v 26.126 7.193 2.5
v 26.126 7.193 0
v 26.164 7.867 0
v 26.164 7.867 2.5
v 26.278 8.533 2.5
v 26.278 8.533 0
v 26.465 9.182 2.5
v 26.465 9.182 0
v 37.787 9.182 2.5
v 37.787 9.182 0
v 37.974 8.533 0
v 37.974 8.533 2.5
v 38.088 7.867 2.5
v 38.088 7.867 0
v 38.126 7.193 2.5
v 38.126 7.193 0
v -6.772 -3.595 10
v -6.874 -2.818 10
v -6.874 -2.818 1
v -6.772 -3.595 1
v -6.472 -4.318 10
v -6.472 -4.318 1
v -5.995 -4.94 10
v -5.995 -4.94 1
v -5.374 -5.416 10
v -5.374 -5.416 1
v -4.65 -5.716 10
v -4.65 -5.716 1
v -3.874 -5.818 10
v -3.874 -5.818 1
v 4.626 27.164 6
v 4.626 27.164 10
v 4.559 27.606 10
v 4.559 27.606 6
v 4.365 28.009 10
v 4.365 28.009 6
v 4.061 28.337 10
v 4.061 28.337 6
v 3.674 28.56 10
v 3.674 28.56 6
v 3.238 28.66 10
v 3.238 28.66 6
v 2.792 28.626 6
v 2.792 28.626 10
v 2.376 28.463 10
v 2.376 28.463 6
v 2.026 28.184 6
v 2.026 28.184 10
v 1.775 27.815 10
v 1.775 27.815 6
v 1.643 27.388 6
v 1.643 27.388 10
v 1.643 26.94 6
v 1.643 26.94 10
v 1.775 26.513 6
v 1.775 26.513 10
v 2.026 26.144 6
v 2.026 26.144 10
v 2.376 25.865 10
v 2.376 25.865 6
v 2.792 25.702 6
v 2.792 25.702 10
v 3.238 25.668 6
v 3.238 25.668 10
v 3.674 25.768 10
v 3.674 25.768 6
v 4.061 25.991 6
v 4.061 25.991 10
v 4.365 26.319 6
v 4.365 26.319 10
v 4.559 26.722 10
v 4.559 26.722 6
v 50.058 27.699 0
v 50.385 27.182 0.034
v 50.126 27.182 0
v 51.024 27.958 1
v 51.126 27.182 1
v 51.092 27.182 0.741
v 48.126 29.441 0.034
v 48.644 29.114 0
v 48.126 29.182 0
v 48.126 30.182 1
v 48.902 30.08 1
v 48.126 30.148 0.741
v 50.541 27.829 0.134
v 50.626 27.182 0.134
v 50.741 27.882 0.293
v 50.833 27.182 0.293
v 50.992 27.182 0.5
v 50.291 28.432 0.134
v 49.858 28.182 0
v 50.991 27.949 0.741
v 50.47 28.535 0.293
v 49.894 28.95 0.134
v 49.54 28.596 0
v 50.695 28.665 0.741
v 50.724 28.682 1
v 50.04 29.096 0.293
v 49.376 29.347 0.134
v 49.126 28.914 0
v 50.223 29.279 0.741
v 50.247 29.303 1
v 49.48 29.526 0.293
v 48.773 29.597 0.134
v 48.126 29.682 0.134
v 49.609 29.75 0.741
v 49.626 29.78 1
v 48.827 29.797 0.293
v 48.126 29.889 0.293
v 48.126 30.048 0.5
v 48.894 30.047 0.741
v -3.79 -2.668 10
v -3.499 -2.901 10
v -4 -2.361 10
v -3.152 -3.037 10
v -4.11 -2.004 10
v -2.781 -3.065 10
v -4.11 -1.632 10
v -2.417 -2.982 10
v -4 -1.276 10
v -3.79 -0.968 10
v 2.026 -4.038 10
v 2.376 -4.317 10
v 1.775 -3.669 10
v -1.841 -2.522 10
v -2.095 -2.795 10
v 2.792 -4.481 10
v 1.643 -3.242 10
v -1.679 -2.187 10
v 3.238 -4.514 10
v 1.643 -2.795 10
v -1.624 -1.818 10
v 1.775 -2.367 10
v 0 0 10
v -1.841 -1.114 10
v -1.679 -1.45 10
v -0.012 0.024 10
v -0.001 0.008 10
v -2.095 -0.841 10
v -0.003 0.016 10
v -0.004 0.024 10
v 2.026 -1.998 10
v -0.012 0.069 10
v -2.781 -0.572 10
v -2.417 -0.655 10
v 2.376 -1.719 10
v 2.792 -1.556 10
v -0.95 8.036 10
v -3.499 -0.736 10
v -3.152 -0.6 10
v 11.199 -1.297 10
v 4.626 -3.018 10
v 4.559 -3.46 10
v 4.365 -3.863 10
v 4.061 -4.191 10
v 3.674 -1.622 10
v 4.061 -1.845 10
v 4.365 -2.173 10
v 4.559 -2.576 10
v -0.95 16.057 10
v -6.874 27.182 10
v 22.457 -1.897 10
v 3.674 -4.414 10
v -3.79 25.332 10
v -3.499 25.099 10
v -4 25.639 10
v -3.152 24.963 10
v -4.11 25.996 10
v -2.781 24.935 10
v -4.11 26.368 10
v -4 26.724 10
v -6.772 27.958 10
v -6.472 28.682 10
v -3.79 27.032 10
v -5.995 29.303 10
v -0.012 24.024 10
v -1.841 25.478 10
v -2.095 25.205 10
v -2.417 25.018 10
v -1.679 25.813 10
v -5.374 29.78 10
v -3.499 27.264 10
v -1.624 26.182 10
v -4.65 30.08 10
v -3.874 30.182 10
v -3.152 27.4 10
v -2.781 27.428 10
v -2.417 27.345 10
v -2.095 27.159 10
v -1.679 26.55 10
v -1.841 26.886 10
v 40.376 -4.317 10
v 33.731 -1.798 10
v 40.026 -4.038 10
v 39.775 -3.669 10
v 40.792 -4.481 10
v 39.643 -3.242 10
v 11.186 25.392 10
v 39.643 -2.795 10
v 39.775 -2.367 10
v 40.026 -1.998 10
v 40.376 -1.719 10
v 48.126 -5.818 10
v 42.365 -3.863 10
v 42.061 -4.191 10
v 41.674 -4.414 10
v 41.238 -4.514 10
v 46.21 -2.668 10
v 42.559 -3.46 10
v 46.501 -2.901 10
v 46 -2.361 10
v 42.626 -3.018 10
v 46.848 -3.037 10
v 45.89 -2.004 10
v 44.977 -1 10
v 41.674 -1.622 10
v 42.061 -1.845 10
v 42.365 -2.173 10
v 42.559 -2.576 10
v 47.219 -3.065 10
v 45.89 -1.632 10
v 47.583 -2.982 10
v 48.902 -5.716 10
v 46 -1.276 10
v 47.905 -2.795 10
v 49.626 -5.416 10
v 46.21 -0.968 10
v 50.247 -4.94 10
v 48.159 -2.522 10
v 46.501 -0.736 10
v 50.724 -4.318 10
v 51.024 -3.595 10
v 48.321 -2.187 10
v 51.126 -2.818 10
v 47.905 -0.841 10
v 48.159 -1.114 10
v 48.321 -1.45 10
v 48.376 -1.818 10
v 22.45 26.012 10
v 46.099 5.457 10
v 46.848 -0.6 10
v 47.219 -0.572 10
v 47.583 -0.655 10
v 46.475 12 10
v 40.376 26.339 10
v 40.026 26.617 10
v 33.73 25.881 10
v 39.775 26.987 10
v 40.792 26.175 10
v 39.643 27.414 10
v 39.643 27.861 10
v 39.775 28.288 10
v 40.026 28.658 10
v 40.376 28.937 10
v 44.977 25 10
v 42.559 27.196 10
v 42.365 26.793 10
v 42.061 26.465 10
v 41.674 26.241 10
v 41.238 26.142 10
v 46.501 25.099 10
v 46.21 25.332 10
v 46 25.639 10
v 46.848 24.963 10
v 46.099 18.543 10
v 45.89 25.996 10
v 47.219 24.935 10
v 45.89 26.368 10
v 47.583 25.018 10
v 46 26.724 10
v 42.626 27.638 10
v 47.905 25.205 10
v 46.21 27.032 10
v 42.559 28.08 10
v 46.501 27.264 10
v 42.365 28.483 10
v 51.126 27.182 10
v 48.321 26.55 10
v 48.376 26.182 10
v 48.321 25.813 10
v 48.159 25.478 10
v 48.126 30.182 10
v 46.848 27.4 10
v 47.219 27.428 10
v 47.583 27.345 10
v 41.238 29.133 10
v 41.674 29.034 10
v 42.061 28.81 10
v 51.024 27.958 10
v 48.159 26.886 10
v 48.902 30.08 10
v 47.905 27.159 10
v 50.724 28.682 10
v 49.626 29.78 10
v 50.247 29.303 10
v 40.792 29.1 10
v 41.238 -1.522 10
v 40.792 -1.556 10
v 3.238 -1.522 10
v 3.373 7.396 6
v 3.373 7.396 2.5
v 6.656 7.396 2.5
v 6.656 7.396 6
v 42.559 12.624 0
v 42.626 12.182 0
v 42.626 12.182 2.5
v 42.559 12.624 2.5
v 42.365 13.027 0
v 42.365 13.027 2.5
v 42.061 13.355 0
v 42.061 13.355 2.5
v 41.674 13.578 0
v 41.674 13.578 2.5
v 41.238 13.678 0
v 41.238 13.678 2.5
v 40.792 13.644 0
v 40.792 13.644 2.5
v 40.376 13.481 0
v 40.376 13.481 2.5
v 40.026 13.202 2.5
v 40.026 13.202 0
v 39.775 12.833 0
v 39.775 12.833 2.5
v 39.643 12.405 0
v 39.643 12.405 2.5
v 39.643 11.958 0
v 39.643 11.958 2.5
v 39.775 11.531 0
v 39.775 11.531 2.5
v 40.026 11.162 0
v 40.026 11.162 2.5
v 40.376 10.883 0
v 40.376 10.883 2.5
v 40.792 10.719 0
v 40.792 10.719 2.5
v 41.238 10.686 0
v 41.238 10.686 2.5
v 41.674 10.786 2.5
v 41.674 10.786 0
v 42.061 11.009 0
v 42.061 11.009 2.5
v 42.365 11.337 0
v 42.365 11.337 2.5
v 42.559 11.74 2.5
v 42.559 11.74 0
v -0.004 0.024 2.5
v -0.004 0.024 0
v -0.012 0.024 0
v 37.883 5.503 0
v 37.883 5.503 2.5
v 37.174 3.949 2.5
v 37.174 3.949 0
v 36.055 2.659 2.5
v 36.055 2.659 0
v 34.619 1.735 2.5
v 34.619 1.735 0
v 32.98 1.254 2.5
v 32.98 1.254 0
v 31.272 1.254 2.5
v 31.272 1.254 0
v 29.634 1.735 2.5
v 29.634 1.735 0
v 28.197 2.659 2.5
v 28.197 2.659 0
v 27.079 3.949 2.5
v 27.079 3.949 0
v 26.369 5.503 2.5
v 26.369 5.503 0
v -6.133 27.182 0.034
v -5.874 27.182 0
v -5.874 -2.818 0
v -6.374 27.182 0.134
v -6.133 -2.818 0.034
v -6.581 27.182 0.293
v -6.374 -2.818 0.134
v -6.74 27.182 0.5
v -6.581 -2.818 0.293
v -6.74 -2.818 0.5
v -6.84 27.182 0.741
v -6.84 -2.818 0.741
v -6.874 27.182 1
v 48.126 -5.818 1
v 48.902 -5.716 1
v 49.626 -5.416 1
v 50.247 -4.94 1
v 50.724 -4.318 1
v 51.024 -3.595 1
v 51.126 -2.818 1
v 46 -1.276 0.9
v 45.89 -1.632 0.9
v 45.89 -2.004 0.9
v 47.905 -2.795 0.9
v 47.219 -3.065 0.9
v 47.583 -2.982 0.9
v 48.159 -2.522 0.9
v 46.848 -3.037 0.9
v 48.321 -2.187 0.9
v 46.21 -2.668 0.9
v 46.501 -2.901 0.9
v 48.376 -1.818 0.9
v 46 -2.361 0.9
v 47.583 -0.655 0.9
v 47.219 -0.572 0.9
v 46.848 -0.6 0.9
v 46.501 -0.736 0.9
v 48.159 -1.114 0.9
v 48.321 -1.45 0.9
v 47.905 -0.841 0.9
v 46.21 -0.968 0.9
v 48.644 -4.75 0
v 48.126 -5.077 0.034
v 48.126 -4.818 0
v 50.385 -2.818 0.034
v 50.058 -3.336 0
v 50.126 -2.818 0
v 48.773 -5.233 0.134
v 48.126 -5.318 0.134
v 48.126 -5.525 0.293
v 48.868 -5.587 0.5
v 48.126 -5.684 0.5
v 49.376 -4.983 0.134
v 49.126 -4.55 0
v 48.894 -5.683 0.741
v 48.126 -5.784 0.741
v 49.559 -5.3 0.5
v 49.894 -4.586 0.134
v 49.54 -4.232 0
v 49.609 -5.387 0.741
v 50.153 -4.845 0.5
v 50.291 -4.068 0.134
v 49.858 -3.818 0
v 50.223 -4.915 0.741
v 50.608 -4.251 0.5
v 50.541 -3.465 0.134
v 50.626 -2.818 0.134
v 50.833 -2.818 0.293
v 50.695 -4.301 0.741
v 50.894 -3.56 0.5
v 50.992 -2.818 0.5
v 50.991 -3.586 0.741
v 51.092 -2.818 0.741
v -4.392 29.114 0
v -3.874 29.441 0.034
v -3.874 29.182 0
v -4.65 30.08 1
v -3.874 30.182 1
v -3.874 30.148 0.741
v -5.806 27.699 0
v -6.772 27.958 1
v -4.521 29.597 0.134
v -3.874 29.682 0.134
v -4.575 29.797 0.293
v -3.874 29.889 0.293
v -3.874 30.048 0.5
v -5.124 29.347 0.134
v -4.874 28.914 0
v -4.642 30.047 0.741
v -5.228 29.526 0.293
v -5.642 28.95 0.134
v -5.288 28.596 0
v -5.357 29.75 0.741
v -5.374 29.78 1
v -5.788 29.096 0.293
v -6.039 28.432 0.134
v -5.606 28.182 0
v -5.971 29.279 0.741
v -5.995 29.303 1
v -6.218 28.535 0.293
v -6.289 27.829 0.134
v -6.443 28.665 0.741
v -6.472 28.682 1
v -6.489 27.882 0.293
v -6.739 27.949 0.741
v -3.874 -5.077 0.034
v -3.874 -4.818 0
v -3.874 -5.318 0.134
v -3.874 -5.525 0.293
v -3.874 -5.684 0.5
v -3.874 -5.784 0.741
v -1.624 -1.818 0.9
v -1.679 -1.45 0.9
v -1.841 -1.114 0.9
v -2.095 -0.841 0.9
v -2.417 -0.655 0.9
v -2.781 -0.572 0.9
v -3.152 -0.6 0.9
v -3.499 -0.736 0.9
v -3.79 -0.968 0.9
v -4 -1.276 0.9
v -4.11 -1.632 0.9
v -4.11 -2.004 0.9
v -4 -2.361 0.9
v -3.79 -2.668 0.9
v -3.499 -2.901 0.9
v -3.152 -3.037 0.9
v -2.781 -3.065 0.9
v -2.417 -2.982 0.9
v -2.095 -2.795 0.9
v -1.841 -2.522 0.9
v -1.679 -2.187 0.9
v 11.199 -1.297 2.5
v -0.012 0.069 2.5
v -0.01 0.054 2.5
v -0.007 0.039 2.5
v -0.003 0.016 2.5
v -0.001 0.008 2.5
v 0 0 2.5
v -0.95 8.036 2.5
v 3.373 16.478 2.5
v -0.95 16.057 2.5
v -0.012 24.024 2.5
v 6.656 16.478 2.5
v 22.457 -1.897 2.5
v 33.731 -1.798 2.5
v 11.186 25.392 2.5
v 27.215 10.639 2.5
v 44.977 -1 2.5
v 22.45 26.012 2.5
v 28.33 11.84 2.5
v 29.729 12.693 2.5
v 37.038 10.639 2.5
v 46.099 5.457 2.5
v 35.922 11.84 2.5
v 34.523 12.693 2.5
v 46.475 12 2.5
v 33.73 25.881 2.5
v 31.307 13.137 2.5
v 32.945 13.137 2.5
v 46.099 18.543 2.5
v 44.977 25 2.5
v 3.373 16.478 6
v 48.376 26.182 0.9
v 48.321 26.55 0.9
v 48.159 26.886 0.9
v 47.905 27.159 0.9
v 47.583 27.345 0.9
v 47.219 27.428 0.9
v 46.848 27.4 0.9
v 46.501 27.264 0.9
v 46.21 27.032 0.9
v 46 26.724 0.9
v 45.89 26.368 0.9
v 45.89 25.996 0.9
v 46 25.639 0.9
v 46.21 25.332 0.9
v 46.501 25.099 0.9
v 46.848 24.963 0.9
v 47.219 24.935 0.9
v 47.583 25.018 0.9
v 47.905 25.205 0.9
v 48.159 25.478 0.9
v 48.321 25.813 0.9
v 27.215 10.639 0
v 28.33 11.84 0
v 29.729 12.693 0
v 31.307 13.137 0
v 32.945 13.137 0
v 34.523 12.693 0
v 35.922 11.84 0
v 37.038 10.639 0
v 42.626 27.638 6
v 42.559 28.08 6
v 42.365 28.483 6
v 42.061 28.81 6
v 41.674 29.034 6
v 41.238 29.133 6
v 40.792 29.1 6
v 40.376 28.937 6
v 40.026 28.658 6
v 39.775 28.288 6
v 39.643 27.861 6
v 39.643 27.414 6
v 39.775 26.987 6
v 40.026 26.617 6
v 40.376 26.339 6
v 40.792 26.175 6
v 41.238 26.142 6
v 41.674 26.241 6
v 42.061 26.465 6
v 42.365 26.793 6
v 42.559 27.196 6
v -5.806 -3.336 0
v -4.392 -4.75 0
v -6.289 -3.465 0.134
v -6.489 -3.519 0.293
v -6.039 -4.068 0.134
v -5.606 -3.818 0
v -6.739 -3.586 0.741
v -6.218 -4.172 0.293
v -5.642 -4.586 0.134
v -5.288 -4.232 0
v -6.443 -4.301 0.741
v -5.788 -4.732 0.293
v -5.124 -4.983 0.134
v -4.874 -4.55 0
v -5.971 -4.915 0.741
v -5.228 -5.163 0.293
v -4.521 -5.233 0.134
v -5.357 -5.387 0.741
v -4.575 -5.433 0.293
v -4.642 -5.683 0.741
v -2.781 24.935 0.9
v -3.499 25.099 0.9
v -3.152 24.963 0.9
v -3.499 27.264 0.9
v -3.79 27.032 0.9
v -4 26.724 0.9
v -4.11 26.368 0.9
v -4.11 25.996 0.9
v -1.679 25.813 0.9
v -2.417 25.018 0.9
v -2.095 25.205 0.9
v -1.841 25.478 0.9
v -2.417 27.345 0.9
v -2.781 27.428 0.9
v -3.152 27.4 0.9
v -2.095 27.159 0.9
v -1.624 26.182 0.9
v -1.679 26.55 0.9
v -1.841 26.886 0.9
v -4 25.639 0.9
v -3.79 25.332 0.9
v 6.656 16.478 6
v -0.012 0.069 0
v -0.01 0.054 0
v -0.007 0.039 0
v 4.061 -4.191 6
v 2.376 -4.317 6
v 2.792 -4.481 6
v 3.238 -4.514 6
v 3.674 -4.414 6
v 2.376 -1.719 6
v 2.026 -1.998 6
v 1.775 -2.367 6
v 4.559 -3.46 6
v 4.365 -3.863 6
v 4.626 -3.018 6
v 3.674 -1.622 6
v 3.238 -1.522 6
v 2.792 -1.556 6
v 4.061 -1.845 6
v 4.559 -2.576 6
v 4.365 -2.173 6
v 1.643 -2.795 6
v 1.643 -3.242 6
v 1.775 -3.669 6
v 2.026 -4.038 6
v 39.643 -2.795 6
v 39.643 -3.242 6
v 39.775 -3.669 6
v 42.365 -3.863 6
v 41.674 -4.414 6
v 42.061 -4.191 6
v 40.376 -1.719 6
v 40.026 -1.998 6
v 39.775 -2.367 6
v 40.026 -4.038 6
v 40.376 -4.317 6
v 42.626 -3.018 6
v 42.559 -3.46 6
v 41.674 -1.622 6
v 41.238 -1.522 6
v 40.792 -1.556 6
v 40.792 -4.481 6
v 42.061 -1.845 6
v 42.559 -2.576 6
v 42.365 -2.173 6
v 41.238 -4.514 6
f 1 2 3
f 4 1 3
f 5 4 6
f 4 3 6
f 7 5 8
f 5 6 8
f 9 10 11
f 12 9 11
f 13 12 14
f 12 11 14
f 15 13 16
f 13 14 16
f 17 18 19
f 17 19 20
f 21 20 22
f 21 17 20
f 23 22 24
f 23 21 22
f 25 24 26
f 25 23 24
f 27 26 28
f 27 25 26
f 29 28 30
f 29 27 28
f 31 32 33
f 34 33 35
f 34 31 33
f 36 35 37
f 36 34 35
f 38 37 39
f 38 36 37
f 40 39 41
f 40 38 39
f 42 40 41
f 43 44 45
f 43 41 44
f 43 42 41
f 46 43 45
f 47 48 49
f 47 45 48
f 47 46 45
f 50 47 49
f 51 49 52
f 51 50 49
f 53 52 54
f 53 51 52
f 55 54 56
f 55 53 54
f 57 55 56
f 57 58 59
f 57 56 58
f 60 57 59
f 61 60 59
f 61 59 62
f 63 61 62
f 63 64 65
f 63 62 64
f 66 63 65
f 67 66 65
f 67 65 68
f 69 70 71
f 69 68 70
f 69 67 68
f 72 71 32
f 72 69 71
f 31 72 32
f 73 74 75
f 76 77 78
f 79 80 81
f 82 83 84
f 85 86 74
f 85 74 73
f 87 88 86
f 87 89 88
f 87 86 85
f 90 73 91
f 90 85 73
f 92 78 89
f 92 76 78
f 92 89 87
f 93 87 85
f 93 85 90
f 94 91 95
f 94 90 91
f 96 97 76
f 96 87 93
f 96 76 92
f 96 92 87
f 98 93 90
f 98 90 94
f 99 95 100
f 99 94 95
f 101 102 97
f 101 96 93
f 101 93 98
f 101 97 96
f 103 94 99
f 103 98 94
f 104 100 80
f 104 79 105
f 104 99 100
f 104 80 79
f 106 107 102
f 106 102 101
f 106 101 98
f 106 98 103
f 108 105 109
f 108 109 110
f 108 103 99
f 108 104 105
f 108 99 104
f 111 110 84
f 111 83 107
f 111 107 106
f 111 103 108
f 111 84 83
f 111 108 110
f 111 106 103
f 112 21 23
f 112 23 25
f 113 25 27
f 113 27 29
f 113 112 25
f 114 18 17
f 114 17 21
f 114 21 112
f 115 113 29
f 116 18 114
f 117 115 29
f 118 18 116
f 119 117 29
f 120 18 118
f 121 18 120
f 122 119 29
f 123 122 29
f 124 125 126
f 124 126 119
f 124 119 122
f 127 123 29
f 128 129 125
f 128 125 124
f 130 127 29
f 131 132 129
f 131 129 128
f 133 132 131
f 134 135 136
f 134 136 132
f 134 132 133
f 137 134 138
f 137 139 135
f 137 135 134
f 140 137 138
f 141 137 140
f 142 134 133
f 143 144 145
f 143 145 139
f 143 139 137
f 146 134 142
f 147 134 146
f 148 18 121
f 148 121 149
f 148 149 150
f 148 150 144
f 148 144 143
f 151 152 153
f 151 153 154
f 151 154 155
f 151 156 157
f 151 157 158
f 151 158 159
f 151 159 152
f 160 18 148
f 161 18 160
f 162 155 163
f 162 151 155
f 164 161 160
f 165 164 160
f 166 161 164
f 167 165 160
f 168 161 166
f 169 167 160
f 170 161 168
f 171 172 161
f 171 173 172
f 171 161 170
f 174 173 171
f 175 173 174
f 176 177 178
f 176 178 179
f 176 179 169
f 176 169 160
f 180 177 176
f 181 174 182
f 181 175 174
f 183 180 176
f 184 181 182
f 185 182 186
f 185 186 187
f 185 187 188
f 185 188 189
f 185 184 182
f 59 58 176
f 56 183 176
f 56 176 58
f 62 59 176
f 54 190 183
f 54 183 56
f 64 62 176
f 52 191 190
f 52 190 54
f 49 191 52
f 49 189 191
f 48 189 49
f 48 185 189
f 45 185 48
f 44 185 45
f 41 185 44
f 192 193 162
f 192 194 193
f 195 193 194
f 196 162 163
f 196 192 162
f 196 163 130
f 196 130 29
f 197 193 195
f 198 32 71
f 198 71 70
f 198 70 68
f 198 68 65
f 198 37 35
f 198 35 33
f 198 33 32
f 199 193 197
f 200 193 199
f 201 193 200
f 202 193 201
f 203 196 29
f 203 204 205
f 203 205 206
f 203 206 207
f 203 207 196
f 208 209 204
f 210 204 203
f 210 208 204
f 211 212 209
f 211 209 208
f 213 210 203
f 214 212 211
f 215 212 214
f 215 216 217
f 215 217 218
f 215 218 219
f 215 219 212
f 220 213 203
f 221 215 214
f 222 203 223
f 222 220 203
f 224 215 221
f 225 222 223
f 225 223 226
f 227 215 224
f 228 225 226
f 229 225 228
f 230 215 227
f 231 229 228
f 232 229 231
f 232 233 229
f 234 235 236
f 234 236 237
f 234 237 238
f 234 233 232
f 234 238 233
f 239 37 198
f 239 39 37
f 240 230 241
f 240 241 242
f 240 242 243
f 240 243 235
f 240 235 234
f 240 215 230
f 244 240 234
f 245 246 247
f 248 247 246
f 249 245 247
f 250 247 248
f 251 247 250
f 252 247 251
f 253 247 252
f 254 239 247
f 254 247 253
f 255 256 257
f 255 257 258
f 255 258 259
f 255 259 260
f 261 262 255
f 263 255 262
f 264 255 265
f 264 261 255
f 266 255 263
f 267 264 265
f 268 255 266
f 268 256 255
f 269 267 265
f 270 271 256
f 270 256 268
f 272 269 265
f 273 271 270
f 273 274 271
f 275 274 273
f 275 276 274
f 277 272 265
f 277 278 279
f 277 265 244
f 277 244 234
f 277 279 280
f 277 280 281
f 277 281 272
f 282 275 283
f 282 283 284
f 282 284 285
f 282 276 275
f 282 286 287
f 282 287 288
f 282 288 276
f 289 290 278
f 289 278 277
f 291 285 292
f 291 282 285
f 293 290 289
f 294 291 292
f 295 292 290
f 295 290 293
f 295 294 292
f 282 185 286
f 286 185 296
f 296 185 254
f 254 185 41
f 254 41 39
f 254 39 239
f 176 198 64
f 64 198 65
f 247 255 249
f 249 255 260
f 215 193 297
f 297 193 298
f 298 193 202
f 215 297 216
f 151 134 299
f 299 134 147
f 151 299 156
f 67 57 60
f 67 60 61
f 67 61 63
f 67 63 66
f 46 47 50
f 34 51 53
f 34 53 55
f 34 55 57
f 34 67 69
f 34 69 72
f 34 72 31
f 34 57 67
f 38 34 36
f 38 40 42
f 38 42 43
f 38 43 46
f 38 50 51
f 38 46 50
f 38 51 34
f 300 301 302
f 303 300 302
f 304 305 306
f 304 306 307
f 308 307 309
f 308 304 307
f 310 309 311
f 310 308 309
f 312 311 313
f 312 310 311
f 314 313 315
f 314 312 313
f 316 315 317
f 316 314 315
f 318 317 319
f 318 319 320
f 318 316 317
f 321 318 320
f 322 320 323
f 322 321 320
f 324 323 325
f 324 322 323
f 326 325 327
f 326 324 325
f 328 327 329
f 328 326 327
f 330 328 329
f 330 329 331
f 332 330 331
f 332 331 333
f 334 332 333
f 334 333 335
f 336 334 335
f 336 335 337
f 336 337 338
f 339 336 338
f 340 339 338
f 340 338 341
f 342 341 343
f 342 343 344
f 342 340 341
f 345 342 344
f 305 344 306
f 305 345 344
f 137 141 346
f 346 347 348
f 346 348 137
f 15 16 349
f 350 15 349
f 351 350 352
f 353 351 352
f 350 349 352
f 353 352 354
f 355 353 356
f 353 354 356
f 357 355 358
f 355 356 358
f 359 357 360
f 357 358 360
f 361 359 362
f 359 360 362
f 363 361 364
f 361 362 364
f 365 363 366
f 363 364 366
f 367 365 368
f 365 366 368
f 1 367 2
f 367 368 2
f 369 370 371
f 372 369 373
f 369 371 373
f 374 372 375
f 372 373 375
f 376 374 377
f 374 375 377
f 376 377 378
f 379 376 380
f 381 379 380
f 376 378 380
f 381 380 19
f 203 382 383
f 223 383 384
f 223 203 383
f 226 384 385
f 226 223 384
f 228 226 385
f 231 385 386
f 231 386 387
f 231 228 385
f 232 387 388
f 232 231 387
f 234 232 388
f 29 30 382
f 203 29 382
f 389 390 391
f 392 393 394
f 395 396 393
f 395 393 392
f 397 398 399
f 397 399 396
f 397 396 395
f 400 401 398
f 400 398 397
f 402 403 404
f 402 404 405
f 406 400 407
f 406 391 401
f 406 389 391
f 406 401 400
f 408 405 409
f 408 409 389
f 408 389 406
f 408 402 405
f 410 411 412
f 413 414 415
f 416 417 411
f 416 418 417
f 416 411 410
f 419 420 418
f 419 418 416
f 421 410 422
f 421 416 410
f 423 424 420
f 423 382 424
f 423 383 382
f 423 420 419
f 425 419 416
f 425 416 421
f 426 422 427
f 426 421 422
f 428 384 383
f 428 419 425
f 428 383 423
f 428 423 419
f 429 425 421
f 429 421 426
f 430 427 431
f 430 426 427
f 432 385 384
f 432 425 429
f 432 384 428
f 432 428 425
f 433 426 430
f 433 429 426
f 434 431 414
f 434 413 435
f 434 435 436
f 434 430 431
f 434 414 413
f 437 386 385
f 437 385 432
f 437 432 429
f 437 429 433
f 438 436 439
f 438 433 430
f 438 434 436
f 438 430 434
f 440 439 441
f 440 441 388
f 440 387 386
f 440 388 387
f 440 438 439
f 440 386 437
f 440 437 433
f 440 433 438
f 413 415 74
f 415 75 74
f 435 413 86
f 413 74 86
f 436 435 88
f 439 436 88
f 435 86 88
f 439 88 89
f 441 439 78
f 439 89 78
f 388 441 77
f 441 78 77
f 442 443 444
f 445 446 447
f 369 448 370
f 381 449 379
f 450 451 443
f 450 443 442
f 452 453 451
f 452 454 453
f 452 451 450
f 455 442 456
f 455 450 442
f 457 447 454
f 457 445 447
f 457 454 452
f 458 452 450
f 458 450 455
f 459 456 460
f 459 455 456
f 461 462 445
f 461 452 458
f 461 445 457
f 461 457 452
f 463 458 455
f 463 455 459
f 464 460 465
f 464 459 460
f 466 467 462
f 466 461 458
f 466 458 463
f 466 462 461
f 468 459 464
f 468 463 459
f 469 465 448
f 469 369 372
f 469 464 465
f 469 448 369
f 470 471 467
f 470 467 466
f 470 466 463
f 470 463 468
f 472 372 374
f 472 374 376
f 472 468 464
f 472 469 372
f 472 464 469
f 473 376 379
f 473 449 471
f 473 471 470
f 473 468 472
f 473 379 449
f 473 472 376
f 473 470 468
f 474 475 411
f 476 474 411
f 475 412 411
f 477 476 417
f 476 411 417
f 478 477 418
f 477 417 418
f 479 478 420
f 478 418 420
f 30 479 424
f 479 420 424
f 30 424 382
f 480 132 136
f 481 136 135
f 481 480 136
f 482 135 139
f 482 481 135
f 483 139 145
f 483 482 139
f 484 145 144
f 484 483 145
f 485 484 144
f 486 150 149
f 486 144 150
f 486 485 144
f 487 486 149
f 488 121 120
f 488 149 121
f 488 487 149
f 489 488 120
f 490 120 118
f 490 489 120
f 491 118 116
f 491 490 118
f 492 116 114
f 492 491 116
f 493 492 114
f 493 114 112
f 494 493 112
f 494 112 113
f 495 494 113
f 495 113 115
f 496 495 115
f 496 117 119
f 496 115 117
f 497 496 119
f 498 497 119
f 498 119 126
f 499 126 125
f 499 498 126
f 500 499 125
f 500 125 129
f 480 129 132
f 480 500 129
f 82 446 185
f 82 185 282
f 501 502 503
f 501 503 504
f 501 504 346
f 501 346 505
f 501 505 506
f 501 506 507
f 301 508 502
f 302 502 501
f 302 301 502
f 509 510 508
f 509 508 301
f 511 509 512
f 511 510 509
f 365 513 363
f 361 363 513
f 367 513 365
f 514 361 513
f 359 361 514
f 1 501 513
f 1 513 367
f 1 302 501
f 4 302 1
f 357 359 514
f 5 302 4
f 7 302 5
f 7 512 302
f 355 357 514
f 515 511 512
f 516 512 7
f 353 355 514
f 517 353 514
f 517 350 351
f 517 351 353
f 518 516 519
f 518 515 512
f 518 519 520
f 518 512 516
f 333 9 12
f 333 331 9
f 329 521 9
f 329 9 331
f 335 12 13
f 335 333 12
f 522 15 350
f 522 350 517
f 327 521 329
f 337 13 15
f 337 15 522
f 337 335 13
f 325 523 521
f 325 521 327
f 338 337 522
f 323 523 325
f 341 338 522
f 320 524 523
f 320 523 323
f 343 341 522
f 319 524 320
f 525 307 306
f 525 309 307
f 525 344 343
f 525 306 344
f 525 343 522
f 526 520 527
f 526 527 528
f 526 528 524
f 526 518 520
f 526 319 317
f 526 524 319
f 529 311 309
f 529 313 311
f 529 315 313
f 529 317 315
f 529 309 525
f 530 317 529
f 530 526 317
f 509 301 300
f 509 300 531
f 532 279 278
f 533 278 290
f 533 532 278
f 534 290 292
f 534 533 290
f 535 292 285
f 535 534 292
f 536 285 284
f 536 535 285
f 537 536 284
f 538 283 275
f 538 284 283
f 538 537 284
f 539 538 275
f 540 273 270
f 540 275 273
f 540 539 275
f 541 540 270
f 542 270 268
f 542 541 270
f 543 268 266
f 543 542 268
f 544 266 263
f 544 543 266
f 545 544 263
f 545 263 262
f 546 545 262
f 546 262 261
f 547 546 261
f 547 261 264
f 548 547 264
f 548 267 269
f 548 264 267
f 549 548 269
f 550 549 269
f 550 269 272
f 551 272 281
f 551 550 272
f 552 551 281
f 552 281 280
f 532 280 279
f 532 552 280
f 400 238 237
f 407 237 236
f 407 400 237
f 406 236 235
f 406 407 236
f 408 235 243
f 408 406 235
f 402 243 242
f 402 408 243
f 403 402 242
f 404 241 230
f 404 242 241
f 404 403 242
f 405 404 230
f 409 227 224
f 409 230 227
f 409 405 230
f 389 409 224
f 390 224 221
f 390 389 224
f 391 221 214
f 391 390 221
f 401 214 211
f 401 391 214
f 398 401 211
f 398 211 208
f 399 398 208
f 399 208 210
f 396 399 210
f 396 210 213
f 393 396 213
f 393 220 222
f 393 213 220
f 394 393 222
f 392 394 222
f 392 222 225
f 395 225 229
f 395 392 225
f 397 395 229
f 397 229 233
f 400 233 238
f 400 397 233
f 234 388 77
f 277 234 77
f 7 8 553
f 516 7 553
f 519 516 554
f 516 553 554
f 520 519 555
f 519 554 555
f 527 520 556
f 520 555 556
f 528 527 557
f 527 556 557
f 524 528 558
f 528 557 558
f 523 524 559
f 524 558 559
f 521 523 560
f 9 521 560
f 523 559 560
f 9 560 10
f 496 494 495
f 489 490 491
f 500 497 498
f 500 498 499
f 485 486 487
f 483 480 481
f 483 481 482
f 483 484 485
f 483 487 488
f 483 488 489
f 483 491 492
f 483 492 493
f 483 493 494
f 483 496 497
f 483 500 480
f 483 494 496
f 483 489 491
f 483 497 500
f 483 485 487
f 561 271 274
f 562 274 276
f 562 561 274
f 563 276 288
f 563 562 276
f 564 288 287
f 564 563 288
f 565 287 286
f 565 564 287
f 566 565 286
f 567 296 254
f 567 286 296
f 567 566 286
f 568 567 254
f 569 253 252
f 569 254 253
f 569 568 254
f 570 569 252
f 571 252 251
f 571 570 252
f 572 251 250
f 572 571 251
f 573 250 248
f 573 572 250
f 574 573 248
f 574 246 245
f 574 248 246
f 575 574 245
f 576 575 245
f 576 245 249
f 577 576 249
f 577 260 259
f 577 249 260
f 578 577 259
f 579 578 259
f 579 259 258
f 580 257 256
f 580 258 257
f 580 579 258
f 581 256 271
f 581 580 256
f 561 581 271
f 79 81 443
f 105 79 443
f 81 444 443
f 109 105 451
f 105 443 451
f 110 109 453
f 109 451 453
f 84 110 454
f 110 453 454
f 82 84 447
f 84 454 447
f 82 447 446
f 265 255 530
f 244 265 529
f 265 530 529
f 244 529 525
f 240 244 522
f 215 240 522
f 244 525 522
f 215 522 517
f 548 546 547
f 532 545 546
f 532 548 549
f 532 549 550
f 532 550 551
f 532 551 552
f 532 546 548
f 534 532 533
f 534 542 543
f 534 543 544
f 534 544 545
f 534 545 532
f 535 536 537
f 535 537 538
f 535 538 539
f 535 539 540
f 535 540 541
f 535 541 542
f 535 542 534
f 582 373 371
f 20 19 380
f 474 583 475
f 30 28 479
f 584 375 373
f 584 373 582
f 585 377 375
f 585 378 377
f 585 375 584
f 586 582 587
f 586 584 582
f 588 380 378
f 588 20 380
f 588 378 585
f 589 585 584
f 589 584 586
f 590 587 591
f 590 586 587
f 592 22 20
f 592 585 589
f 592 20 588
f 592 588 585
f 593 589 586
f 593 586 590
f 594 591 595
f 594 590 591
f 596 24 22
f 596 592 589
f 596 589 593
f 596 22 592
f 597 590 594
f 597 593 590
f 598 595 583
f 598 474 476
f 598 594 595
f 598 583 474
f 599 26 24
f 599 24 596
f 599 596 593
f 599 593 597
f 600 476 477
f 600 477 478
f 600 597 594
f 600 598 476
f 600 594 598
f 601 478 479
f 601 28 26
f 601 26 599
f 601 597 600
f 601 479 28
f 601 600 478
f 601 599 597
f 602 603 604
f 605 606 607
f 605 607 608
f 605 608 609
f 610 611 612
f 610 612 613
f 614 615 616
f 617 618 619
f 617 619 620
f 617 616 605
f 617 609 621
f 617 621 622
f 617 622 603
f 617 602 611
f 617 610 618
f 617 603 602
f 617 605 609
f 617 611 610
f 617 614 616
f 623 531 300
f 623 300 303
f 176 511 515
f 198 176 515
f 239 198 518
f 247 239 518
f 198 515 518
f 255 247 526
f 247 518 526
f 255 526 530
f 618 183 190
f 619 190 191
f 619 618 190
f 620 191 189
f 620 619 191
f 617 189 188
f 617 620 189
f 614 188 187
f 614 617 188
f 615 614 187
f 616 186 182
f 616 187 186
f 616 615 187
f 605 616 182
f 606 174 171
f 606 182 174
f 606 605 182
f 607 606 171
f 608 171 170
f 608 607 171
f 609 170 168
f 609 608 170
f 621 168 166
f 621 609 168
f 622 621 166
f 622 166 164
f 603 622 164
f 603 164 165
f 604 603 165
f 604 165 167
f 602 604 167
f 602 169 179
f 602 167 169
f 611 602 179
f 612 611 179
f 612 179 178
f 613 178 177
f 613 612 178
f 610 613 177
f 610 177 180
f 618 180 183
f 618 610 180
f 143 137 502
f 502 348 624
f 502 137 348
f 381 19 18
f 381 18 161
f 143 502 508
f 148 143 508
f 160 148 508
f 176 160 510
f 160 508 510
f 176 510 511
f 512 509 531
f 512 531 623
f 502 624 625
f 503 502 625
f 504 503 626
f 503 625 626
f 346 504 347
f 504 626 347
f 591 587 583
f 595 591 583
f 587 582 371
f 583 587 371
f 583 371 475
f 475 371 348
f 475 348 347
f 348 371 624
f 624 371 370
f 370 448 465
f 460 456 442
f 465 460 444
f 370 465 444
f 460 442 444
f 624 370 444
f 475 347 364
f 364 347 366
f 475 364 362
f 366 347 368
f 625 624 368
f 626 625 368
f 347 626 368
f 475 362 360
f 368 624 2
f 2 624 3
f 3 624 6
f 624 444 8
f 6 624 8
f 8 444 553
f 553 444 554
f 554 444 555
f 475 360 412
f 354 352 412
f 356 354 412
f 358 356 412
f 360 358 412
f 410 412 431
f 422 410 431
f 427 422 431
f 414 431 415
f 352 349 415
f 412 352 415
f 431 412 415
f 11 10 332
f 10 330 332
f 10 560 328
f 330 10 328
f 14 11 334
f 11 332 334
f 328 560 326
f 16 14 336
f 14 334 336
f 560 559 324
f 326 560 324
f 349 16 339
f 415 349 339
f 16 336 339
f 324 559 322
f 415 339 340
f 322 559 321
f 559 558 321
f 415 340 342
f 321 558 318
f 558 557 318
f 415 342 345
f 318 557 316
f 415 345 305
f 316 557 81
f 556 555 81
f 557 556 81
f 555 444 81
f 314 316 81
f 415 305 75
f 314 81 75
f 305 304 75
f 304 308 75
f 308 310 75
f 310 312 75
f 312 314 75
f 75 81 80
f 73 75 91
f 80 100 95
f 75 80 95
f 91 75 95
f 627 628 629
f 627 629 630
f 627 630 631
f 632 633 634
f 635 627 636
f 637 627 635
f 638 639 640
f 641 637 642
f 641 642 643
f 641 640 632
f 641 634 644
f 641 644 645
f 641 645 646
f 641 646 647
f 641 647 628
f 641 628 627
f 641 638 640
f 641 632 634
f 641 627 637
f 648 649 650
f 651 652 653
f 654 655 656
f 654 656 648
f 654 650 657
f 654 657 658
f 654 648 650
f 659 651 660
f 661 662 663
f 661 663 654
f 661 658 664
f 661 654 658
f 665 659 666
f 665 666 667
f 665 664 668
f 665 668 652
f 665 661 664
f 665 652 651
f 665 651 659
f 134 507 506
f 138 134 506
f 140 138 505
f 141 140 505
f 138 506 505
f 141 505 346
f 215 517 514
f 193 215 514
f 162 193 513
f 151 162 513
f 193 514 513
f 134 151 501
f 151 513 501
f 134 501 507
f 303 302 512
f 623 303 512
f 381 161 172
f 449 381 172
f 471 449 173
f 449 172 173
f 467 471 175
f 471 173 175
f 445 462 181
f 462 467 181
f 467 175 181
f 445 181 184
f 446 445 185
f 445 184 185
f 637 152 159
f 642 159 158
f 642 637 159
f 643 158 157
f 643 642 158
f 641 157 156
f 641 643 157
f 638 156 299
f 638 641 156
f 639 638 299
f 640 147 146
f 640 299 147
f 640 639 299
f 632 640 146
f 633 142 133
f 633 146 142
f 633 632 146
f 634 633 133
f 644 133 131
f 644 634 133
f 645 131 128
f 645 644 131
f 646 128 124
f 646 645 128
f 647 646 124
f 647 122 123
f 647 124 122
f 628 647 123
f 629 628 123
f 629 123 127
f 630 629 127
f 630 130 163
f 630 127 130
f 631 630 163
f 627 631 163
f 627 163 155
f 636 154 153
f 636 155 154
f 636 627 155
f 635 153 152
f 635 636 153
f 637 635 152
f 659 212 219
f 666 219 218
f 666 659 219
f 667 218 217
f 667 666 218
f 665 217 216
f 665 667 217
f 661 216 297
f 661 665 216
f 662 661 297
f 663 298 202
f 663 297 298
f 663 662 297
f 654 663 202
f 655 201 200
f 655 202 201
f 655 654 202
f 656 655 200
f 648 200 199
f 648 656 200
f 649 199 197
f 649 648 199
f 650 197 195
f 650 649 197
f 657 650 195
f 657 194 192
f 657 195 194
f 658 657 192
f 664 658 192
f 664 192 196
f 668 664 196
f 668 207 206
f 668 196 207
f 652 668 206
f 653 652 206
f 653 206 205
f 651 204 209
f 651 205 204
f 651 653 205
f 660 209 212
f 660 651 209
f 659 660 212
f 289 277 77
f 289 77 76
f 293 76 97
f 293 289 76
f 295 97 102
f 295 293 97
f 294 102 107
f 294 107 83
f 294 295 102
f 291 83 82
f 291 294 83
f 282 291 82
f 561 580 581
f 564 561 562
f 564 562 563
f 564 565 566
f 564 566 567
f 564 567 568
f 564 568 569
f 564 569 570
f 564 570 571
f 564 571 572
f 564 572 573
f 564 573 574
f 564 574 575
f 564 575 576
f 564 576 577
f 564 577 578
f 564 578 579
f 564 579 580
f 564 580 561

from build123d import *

# Parameters (mm, degrees)
F0_W     = 58
F0_H     = 36
F0_R     = 1.25
F0_R_2   = 1.5
F1_DEPTH = 10
F0_R_3   = 1
F0_W_2   = 3.2825097442
F0_H_2   = 9.0816104785
F2_DEPTH = 2.5
F3_R     = 3
F4_DEPTH = 6
F5_START = 0.9
F5_DEPTH = 16.2
F6_START = 6
F6_DEPTH = 10.7
F7_R     = 1


with BuildPart() as f1:
    # F0 (on Top) → F1 (new body)
    with BuildSketch(Plane.XY):
        with Locations((22.1260370687, 12.181818096)):
            Rectangle(F0_W, F0_H)
        with Locations((-2.8739629313, -1.818181904)):
            Circle(F0_R, mode=Mode.SUBTRACT)
        with Locations((3.1260370687, -3.018181904)):
            Circle(F0_R_2, mode=Mode.SUBTRACT)
        with Locations((41.1260370687, -3.018181904)):
            Circle(F0_R_2, mode=Mode.SUBTRACT)
        with Locations((47.1260370687, -1.818181904)):
            Circle(F0_R, mode=Mode.SUBTRACT)
        with BuildLine():
            Line((-0.0042433119, 0.0237876128), (-0.0123524841, 0.02397218))
            Line((-0.0123524841, 0.02397218), (-0.0123524841, 0.0693824727))
            ThreePointArc((-0.0123524841, 0.0693824727), (-1.0671188126, 12.0466773263), (-0.0123524841, 24.02397218))
            ThreePointArc((-0.0123524841, 24.02397218), (22.4498159336, 26.0118318189), (44.9770614896, 25))
            ThreePointArc((44.9770614896, 25), (46.474513746, 12), (44.9770614896, -1))
            ThreePointArc((44.9770614896, -1), (22.4574664967, -1.8971785964), (0, 0))
            ThreePointArc((0, 0), (-0.0021227043, 0.0118936194), (-0.0042433119, 0.0237876128))
        make_face(mode=Mode.SUBTRACT)
        with Locations((-2.8739629313, 26.181818096)):
            Circle(F0_R, mode=Mode.SUBTRACT)
        with Locations((3.1260370687, 27.16396598)):
            Circle(F0_R_2, mode=Mode.SUBTRACT)
        with Locations((41.1260370687, 27.6376707083)):
            Circle(F0_R_2, mode=Mode.SUBTRACT)
        with Locations((47.1260370687, 26.181818096)):
            Circle(F0_R, mode=Mode.SUBTRACT)
        with Locations((-2.8739629313, 26.181818096)):
            Circle(F0_R)
        with Locations((47.1260370687, 26.181818096)):
            Circle(F0_R)
        with Locations((47.1260370687, -1.818181904)):
            Circle(F0_R)
        with Locations((-2.8739629313, -1.818181904)):
            Circle(F0_R)
        with Locations((3.1260370687, -3.018181904)):
            Circle(F0_R_2)
        with Locations((3.1260370687, 27.16396598)):
            Circle(F0_R_2)
        with Locations((41.1260370687, 27.6376707083)):
            Circle(F0_R_2)
        with Locations((41.1260370687, -3.018181904)):
            Circle(F0_R_2)
    extrude(amount=F1_DEPTH)

    # F0 (on Top) → F2 (join)
    with BuildSketch(Plane.XY):
        with BuildLine():
            ThreePointArc((-0.0123524841, 24.02397218), (-1.0671188126, 12.0466773263), (-0.0123524841, 0.0693824727))
            Line((-0.0123524841, 0.0693824727), (-0.0123524841, 24.02397218))
        make_face()
        with BuildLine():
            Line((-0.0123524841, 24.02397218), (-0.0123524841, 0.0693824727))
            ThreePointArc((-0.0123524841, 0.0693824727), (-0.0083017494, 0.0465843578), (-0.0042433119, 0.0237876128))
            Line((-0.0042433119, 0.0237876128), (44.9770614896, -1))
            Line((44.9770614896, -1), (44.9770614896, 25))
            Line((44.9770614896, 25), (-0.0123524841, 24.02397218))
        make_face()
        with Locations((2.9621722015, 2.0848012064)):
            Circle(F0_R_3, mode=Mode.SUBTRACT)
        with Locations((5.0146379508, 11.9371688925)):
            Rectangle(F0_W_2, F0_H_2, mode=Mode.SUBTRACT)
        with Locations((41.7125664489, 2.0848012064)):
            Circle(F0_R_3, mode=Mode.SUBTRACT)
        with BuildLine():
            Line((26.1260370687, 7.1930042468), (26.1260370687, 9.181818096))
            Line((26.1260370687, 9.181818096), (26.4652403515, 9.181818096))
            ThreePointArc((26.4652403515, 9.181818096), (32.1260370687, 13.1930042468), (37.7868337859, 9.181818096))
            Line((37.7868337859, 9.181818096), (38.1260370687, 9.181818096))
            Line((38.1260370687, 9.181818096), (38.1260370687, 7.1930042468))
            Line((38.1260370687, 7.1930042468), (38.1260370687, 1.181818096))
            Line((38.1260370687, 1.181818096), (26.1260370687, 1.181818096))
            Line((26.1260370687, 1.181818096), (26.1260370687, 7.1930042468))
        make_face(mode=Mode.SUBTRACT)
        with Locations((41.1260370687, 12.181818096)):
            Circle(F0_R_2, mode=Mode.SUBTRACT)
        with Locations((18.8074270263, 12.2937392443)):
            Circle(F0_R_3, mode=Mode.SUBTRACT)
        with Locations((2.9621722015, 21.6664075851)):
            Circle(F0_R_3, mode=Mode.SUBTRACT)
        with Locations((26.8074270263, 12.2937392443)):
            Circle(F0_R_3, mode=Mode.SUBTRACT)
        with Locations((41.7125664489, 21.6664075851)):
            Circle(F0_R_3, mode=Mode.SUBTRACT)
        with BuildLine():
            Line((44.9770614896, -1), (-0.0042433119, 0.0237876128))
            ThreePointArc((-0.0042433119, 0.0237876128), (-0.0021227043, 0.0118936194), (0, 0))
            ThreePointArc((0, 0), (22.4574664967, -1.8971785964), (44.9770614896, -1))
        make_face()
        with BuildLine():
            ThreePointArc((44.9770614896, 25), (22.4498159336, 26.0118318189), (-0.0123524841, 24.02397218))
            Line((-0.0123524841, 24.02397218), (44.9770614896, 25))
        make_face()
        with BuildLine():
            Line((44.9770614896, 25), (44.9770614896, -1))
            ThreePointArc((44.9770614896, -1), (46.474513746, 12), (44.9770614896, 25))
        make_face()
        with Locations((2.9621722015, 21.6664075851)):
            Circle(F0_R_3)
        with Locations((2.9621722015, 2.0848012064)):
            Circle(F0_R_3)
        with Locations((41.7125664489, 2.0848012064)):
            Circle(F0_R_3)
        with Locations((41.7125664489, 21.6664075851)):
            Circle(F0_R_3)
        with Locations((18.8074270263, 12.2937392443)):
            Circle(F0_R_3)
        with Locations((26.8074270263, 12.2937392443)):
            Circle(F0_R_3)
        with Locations((5.0146379508, 11.9371688925)):
            Rectangle(F0_W_2, F0_H_2)
        with BuildLine():
            Line((26.4652403515, 9.181818096), (26.1260370687, 9.181818096))
            Line((26.1260370687, 9.181818096), (26.1260370687, 7.1930042468))
            ThreePointArc((26.1260370687, 7.1930042468), (26.2114457767, 8.2017707453), (26.4652403515, 9.181818096))
        make_face()
        with BuildLine():
            ThreePointArc((38.1260370687, 7.1930042468), (32.1260370687, 1.1930042468), (26.1260370687, 7.1930042468))
            Line((26.1260370687, 7.1930042468), (26.1260370687, 1.181818096))
            Line((26.1260370687, 1.181818096), (38.1260370687, 1.181818096))
            Line((38.1260370687, 1.181818096), (38.1260370687, 7.1930042468))
        make_face()
        with BuildLine():
            Line((38.1260370687, 9.181818096), (37.7868337859, 9.181818096))
            ThreePointArc((37.7868337859, 9.181818096), (38.0406283607, 8.2017707453), (38.1260370687, 7.1930042468))
            Line((38.1260370687, 7.1930042468), (38.1260370687, 9.181818096))
        make_face()
    extrude(amount=F2_DEPTH)

    # F3
    f3_edges = [f1.edges().sort_by_distance(p)[0] for p in [
        (51.126037, 30.181818, 5),
        (51.126037, -5.818182, 5),
        (-6.873963, -5.818182, 5),
        (-6.873963, 30.181818, 5),
    ]]
    fillet(f3_edges, radius=F3_R)

    # F0 (on Top) → F4 (join)
    with BuildSketch(Plane.XY):
        with Locations((5.0146379508, 11.9371688925)):
            Rectangle(F0_W_2, F0_H_2)
    extrude(amount=F4_DEPTH)

    # F0 (on Top) → F5 (cut)
    with BuildSketch(Plane.XY.offset(F5_START)):
        with Locations((47.1260370687, 26.181818096)):
            Circle(F0_R)
        with Locations((-2.8739629313, 26.181818096)):
            Circle(F0_R)
        with Locations((-2.8739629313, -1.818181904)):
            Circle(F0_R)
        with Locations((47.1260370687, -1.818181904)):
            Circle(F0_R)
    extrude(amount=F5_DEPTH, mode=Mode.SUBTRACT)

    # F0 (on Top) → F6 (cut)
    with BuildSketch(Plane.XY.offset(F6_START)):
        with Locations((3.1260370687, 27.16396598)):
            Circle(F0_R_2)
        with Locations((41.1260370687, 27.6376707083)):
            Circle(F0_R_2)
        with Locations((41.1260370687, -3.018181904)):
            Circle(F0_R_2)
        with Locations((3.1260370687, -3.018181904)):
            Circle(F0_R_2)
    extrude(amount=F6_DEPTH, mode=Mode.SUBTRACT)

    # F7
    f7_edges = [f1.edges().sort_by_distance(p)[0] for p in [
        (51.126037, 12.181818, 0),
        (22.126037, -5.818182, 0),
        (50.247357, -4.939502, 0),
        (50.247357, 29.303138, 0),
        (22.126037, 30.181818, 0),
        (-5.995283, 29.303138, 0),
        (-6.873963, 12.181818, 0),
        (-5.995283, -4.939502, 0),
    ]]
    fillet(f7_edges, radius=F7_R)


solid = f1.part
